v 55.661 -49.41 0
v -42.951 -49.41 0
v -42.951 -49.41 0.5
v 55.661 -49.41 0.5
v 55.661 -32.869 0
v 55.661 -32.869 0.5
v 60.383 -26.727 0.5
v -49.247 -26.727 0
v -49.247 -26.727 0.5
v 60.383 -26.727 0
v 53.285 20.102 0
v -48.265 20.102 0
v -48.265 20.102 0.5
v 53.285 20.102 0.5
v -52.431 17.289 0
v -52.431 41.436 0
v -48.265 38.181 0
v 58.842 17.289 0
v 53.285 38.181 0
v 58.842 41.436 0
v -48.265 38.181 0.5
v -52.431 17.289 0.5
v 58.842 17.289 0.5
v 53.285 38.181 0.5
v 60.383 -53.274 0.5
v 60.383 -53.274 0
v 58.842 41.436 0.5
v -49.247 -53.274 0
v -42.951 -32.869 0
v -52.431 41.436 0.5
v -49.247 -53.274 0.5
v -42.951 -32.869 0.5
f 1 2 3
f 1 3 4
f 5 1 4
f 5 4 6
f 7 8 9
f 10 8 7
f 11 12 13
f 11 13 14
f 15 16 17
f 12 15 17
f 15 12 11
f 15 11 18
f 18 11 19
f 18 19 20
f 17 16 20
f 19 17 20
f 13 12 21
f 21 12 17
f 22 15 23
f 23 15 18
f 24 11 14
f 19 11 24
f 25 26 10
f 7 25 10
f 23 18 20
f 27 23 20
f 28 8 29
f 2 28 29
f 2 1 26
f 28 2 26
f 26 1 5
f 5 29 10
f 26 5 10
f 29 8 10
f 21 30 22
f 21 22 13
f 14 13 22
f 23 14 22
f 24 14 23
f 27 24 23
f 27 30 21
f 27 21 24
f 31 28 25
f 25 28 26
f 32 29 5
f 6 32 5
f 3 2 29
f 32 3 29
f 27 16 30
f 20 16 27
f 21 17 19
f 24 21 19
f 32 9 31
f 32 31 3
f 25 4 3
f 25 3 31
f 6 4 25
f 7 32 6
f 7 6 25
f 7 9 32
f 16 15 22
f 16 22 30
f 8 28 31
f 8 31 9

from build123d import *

# Parameters (mm, degrees)
F0_W     = 111.27311
F0_H     = 24.147012
F0_W_2   = 101.550408
F0_H_2   = 18.079297
F1_W     = 109.629869
F1_H     = 26.546598
F1_W_2   = 98.612734
F1_H_2   = 16.540528
F2_DEPTH = 0.5


with BuildPart() as f2:
    # F0 (on Top) + F1 (on Top) → F2 (new body)
    with BuildSketch(Plane.XY):
        with Locations((3.205359, 29.362034)):
            Rectangle(F0_W, F0_H)
        with Locations((2.509814, 29.141478)):
            Rectangle(F0_W_2, F0_H_2, mode=Mode.SUBTRACT)
    with BuildSketch(Plane.XY):
        with Locations((5.56776, -40.000662)):
            Rectangle(F1_W, F1_H)
        with Locations((6.355118, -41.139573)):
            Rectangle(F1_W_2, F1_H_2, mode=Mode.SUBTRACT)
    extrude(amount=F2_DEPTH)


solid = f2.part
